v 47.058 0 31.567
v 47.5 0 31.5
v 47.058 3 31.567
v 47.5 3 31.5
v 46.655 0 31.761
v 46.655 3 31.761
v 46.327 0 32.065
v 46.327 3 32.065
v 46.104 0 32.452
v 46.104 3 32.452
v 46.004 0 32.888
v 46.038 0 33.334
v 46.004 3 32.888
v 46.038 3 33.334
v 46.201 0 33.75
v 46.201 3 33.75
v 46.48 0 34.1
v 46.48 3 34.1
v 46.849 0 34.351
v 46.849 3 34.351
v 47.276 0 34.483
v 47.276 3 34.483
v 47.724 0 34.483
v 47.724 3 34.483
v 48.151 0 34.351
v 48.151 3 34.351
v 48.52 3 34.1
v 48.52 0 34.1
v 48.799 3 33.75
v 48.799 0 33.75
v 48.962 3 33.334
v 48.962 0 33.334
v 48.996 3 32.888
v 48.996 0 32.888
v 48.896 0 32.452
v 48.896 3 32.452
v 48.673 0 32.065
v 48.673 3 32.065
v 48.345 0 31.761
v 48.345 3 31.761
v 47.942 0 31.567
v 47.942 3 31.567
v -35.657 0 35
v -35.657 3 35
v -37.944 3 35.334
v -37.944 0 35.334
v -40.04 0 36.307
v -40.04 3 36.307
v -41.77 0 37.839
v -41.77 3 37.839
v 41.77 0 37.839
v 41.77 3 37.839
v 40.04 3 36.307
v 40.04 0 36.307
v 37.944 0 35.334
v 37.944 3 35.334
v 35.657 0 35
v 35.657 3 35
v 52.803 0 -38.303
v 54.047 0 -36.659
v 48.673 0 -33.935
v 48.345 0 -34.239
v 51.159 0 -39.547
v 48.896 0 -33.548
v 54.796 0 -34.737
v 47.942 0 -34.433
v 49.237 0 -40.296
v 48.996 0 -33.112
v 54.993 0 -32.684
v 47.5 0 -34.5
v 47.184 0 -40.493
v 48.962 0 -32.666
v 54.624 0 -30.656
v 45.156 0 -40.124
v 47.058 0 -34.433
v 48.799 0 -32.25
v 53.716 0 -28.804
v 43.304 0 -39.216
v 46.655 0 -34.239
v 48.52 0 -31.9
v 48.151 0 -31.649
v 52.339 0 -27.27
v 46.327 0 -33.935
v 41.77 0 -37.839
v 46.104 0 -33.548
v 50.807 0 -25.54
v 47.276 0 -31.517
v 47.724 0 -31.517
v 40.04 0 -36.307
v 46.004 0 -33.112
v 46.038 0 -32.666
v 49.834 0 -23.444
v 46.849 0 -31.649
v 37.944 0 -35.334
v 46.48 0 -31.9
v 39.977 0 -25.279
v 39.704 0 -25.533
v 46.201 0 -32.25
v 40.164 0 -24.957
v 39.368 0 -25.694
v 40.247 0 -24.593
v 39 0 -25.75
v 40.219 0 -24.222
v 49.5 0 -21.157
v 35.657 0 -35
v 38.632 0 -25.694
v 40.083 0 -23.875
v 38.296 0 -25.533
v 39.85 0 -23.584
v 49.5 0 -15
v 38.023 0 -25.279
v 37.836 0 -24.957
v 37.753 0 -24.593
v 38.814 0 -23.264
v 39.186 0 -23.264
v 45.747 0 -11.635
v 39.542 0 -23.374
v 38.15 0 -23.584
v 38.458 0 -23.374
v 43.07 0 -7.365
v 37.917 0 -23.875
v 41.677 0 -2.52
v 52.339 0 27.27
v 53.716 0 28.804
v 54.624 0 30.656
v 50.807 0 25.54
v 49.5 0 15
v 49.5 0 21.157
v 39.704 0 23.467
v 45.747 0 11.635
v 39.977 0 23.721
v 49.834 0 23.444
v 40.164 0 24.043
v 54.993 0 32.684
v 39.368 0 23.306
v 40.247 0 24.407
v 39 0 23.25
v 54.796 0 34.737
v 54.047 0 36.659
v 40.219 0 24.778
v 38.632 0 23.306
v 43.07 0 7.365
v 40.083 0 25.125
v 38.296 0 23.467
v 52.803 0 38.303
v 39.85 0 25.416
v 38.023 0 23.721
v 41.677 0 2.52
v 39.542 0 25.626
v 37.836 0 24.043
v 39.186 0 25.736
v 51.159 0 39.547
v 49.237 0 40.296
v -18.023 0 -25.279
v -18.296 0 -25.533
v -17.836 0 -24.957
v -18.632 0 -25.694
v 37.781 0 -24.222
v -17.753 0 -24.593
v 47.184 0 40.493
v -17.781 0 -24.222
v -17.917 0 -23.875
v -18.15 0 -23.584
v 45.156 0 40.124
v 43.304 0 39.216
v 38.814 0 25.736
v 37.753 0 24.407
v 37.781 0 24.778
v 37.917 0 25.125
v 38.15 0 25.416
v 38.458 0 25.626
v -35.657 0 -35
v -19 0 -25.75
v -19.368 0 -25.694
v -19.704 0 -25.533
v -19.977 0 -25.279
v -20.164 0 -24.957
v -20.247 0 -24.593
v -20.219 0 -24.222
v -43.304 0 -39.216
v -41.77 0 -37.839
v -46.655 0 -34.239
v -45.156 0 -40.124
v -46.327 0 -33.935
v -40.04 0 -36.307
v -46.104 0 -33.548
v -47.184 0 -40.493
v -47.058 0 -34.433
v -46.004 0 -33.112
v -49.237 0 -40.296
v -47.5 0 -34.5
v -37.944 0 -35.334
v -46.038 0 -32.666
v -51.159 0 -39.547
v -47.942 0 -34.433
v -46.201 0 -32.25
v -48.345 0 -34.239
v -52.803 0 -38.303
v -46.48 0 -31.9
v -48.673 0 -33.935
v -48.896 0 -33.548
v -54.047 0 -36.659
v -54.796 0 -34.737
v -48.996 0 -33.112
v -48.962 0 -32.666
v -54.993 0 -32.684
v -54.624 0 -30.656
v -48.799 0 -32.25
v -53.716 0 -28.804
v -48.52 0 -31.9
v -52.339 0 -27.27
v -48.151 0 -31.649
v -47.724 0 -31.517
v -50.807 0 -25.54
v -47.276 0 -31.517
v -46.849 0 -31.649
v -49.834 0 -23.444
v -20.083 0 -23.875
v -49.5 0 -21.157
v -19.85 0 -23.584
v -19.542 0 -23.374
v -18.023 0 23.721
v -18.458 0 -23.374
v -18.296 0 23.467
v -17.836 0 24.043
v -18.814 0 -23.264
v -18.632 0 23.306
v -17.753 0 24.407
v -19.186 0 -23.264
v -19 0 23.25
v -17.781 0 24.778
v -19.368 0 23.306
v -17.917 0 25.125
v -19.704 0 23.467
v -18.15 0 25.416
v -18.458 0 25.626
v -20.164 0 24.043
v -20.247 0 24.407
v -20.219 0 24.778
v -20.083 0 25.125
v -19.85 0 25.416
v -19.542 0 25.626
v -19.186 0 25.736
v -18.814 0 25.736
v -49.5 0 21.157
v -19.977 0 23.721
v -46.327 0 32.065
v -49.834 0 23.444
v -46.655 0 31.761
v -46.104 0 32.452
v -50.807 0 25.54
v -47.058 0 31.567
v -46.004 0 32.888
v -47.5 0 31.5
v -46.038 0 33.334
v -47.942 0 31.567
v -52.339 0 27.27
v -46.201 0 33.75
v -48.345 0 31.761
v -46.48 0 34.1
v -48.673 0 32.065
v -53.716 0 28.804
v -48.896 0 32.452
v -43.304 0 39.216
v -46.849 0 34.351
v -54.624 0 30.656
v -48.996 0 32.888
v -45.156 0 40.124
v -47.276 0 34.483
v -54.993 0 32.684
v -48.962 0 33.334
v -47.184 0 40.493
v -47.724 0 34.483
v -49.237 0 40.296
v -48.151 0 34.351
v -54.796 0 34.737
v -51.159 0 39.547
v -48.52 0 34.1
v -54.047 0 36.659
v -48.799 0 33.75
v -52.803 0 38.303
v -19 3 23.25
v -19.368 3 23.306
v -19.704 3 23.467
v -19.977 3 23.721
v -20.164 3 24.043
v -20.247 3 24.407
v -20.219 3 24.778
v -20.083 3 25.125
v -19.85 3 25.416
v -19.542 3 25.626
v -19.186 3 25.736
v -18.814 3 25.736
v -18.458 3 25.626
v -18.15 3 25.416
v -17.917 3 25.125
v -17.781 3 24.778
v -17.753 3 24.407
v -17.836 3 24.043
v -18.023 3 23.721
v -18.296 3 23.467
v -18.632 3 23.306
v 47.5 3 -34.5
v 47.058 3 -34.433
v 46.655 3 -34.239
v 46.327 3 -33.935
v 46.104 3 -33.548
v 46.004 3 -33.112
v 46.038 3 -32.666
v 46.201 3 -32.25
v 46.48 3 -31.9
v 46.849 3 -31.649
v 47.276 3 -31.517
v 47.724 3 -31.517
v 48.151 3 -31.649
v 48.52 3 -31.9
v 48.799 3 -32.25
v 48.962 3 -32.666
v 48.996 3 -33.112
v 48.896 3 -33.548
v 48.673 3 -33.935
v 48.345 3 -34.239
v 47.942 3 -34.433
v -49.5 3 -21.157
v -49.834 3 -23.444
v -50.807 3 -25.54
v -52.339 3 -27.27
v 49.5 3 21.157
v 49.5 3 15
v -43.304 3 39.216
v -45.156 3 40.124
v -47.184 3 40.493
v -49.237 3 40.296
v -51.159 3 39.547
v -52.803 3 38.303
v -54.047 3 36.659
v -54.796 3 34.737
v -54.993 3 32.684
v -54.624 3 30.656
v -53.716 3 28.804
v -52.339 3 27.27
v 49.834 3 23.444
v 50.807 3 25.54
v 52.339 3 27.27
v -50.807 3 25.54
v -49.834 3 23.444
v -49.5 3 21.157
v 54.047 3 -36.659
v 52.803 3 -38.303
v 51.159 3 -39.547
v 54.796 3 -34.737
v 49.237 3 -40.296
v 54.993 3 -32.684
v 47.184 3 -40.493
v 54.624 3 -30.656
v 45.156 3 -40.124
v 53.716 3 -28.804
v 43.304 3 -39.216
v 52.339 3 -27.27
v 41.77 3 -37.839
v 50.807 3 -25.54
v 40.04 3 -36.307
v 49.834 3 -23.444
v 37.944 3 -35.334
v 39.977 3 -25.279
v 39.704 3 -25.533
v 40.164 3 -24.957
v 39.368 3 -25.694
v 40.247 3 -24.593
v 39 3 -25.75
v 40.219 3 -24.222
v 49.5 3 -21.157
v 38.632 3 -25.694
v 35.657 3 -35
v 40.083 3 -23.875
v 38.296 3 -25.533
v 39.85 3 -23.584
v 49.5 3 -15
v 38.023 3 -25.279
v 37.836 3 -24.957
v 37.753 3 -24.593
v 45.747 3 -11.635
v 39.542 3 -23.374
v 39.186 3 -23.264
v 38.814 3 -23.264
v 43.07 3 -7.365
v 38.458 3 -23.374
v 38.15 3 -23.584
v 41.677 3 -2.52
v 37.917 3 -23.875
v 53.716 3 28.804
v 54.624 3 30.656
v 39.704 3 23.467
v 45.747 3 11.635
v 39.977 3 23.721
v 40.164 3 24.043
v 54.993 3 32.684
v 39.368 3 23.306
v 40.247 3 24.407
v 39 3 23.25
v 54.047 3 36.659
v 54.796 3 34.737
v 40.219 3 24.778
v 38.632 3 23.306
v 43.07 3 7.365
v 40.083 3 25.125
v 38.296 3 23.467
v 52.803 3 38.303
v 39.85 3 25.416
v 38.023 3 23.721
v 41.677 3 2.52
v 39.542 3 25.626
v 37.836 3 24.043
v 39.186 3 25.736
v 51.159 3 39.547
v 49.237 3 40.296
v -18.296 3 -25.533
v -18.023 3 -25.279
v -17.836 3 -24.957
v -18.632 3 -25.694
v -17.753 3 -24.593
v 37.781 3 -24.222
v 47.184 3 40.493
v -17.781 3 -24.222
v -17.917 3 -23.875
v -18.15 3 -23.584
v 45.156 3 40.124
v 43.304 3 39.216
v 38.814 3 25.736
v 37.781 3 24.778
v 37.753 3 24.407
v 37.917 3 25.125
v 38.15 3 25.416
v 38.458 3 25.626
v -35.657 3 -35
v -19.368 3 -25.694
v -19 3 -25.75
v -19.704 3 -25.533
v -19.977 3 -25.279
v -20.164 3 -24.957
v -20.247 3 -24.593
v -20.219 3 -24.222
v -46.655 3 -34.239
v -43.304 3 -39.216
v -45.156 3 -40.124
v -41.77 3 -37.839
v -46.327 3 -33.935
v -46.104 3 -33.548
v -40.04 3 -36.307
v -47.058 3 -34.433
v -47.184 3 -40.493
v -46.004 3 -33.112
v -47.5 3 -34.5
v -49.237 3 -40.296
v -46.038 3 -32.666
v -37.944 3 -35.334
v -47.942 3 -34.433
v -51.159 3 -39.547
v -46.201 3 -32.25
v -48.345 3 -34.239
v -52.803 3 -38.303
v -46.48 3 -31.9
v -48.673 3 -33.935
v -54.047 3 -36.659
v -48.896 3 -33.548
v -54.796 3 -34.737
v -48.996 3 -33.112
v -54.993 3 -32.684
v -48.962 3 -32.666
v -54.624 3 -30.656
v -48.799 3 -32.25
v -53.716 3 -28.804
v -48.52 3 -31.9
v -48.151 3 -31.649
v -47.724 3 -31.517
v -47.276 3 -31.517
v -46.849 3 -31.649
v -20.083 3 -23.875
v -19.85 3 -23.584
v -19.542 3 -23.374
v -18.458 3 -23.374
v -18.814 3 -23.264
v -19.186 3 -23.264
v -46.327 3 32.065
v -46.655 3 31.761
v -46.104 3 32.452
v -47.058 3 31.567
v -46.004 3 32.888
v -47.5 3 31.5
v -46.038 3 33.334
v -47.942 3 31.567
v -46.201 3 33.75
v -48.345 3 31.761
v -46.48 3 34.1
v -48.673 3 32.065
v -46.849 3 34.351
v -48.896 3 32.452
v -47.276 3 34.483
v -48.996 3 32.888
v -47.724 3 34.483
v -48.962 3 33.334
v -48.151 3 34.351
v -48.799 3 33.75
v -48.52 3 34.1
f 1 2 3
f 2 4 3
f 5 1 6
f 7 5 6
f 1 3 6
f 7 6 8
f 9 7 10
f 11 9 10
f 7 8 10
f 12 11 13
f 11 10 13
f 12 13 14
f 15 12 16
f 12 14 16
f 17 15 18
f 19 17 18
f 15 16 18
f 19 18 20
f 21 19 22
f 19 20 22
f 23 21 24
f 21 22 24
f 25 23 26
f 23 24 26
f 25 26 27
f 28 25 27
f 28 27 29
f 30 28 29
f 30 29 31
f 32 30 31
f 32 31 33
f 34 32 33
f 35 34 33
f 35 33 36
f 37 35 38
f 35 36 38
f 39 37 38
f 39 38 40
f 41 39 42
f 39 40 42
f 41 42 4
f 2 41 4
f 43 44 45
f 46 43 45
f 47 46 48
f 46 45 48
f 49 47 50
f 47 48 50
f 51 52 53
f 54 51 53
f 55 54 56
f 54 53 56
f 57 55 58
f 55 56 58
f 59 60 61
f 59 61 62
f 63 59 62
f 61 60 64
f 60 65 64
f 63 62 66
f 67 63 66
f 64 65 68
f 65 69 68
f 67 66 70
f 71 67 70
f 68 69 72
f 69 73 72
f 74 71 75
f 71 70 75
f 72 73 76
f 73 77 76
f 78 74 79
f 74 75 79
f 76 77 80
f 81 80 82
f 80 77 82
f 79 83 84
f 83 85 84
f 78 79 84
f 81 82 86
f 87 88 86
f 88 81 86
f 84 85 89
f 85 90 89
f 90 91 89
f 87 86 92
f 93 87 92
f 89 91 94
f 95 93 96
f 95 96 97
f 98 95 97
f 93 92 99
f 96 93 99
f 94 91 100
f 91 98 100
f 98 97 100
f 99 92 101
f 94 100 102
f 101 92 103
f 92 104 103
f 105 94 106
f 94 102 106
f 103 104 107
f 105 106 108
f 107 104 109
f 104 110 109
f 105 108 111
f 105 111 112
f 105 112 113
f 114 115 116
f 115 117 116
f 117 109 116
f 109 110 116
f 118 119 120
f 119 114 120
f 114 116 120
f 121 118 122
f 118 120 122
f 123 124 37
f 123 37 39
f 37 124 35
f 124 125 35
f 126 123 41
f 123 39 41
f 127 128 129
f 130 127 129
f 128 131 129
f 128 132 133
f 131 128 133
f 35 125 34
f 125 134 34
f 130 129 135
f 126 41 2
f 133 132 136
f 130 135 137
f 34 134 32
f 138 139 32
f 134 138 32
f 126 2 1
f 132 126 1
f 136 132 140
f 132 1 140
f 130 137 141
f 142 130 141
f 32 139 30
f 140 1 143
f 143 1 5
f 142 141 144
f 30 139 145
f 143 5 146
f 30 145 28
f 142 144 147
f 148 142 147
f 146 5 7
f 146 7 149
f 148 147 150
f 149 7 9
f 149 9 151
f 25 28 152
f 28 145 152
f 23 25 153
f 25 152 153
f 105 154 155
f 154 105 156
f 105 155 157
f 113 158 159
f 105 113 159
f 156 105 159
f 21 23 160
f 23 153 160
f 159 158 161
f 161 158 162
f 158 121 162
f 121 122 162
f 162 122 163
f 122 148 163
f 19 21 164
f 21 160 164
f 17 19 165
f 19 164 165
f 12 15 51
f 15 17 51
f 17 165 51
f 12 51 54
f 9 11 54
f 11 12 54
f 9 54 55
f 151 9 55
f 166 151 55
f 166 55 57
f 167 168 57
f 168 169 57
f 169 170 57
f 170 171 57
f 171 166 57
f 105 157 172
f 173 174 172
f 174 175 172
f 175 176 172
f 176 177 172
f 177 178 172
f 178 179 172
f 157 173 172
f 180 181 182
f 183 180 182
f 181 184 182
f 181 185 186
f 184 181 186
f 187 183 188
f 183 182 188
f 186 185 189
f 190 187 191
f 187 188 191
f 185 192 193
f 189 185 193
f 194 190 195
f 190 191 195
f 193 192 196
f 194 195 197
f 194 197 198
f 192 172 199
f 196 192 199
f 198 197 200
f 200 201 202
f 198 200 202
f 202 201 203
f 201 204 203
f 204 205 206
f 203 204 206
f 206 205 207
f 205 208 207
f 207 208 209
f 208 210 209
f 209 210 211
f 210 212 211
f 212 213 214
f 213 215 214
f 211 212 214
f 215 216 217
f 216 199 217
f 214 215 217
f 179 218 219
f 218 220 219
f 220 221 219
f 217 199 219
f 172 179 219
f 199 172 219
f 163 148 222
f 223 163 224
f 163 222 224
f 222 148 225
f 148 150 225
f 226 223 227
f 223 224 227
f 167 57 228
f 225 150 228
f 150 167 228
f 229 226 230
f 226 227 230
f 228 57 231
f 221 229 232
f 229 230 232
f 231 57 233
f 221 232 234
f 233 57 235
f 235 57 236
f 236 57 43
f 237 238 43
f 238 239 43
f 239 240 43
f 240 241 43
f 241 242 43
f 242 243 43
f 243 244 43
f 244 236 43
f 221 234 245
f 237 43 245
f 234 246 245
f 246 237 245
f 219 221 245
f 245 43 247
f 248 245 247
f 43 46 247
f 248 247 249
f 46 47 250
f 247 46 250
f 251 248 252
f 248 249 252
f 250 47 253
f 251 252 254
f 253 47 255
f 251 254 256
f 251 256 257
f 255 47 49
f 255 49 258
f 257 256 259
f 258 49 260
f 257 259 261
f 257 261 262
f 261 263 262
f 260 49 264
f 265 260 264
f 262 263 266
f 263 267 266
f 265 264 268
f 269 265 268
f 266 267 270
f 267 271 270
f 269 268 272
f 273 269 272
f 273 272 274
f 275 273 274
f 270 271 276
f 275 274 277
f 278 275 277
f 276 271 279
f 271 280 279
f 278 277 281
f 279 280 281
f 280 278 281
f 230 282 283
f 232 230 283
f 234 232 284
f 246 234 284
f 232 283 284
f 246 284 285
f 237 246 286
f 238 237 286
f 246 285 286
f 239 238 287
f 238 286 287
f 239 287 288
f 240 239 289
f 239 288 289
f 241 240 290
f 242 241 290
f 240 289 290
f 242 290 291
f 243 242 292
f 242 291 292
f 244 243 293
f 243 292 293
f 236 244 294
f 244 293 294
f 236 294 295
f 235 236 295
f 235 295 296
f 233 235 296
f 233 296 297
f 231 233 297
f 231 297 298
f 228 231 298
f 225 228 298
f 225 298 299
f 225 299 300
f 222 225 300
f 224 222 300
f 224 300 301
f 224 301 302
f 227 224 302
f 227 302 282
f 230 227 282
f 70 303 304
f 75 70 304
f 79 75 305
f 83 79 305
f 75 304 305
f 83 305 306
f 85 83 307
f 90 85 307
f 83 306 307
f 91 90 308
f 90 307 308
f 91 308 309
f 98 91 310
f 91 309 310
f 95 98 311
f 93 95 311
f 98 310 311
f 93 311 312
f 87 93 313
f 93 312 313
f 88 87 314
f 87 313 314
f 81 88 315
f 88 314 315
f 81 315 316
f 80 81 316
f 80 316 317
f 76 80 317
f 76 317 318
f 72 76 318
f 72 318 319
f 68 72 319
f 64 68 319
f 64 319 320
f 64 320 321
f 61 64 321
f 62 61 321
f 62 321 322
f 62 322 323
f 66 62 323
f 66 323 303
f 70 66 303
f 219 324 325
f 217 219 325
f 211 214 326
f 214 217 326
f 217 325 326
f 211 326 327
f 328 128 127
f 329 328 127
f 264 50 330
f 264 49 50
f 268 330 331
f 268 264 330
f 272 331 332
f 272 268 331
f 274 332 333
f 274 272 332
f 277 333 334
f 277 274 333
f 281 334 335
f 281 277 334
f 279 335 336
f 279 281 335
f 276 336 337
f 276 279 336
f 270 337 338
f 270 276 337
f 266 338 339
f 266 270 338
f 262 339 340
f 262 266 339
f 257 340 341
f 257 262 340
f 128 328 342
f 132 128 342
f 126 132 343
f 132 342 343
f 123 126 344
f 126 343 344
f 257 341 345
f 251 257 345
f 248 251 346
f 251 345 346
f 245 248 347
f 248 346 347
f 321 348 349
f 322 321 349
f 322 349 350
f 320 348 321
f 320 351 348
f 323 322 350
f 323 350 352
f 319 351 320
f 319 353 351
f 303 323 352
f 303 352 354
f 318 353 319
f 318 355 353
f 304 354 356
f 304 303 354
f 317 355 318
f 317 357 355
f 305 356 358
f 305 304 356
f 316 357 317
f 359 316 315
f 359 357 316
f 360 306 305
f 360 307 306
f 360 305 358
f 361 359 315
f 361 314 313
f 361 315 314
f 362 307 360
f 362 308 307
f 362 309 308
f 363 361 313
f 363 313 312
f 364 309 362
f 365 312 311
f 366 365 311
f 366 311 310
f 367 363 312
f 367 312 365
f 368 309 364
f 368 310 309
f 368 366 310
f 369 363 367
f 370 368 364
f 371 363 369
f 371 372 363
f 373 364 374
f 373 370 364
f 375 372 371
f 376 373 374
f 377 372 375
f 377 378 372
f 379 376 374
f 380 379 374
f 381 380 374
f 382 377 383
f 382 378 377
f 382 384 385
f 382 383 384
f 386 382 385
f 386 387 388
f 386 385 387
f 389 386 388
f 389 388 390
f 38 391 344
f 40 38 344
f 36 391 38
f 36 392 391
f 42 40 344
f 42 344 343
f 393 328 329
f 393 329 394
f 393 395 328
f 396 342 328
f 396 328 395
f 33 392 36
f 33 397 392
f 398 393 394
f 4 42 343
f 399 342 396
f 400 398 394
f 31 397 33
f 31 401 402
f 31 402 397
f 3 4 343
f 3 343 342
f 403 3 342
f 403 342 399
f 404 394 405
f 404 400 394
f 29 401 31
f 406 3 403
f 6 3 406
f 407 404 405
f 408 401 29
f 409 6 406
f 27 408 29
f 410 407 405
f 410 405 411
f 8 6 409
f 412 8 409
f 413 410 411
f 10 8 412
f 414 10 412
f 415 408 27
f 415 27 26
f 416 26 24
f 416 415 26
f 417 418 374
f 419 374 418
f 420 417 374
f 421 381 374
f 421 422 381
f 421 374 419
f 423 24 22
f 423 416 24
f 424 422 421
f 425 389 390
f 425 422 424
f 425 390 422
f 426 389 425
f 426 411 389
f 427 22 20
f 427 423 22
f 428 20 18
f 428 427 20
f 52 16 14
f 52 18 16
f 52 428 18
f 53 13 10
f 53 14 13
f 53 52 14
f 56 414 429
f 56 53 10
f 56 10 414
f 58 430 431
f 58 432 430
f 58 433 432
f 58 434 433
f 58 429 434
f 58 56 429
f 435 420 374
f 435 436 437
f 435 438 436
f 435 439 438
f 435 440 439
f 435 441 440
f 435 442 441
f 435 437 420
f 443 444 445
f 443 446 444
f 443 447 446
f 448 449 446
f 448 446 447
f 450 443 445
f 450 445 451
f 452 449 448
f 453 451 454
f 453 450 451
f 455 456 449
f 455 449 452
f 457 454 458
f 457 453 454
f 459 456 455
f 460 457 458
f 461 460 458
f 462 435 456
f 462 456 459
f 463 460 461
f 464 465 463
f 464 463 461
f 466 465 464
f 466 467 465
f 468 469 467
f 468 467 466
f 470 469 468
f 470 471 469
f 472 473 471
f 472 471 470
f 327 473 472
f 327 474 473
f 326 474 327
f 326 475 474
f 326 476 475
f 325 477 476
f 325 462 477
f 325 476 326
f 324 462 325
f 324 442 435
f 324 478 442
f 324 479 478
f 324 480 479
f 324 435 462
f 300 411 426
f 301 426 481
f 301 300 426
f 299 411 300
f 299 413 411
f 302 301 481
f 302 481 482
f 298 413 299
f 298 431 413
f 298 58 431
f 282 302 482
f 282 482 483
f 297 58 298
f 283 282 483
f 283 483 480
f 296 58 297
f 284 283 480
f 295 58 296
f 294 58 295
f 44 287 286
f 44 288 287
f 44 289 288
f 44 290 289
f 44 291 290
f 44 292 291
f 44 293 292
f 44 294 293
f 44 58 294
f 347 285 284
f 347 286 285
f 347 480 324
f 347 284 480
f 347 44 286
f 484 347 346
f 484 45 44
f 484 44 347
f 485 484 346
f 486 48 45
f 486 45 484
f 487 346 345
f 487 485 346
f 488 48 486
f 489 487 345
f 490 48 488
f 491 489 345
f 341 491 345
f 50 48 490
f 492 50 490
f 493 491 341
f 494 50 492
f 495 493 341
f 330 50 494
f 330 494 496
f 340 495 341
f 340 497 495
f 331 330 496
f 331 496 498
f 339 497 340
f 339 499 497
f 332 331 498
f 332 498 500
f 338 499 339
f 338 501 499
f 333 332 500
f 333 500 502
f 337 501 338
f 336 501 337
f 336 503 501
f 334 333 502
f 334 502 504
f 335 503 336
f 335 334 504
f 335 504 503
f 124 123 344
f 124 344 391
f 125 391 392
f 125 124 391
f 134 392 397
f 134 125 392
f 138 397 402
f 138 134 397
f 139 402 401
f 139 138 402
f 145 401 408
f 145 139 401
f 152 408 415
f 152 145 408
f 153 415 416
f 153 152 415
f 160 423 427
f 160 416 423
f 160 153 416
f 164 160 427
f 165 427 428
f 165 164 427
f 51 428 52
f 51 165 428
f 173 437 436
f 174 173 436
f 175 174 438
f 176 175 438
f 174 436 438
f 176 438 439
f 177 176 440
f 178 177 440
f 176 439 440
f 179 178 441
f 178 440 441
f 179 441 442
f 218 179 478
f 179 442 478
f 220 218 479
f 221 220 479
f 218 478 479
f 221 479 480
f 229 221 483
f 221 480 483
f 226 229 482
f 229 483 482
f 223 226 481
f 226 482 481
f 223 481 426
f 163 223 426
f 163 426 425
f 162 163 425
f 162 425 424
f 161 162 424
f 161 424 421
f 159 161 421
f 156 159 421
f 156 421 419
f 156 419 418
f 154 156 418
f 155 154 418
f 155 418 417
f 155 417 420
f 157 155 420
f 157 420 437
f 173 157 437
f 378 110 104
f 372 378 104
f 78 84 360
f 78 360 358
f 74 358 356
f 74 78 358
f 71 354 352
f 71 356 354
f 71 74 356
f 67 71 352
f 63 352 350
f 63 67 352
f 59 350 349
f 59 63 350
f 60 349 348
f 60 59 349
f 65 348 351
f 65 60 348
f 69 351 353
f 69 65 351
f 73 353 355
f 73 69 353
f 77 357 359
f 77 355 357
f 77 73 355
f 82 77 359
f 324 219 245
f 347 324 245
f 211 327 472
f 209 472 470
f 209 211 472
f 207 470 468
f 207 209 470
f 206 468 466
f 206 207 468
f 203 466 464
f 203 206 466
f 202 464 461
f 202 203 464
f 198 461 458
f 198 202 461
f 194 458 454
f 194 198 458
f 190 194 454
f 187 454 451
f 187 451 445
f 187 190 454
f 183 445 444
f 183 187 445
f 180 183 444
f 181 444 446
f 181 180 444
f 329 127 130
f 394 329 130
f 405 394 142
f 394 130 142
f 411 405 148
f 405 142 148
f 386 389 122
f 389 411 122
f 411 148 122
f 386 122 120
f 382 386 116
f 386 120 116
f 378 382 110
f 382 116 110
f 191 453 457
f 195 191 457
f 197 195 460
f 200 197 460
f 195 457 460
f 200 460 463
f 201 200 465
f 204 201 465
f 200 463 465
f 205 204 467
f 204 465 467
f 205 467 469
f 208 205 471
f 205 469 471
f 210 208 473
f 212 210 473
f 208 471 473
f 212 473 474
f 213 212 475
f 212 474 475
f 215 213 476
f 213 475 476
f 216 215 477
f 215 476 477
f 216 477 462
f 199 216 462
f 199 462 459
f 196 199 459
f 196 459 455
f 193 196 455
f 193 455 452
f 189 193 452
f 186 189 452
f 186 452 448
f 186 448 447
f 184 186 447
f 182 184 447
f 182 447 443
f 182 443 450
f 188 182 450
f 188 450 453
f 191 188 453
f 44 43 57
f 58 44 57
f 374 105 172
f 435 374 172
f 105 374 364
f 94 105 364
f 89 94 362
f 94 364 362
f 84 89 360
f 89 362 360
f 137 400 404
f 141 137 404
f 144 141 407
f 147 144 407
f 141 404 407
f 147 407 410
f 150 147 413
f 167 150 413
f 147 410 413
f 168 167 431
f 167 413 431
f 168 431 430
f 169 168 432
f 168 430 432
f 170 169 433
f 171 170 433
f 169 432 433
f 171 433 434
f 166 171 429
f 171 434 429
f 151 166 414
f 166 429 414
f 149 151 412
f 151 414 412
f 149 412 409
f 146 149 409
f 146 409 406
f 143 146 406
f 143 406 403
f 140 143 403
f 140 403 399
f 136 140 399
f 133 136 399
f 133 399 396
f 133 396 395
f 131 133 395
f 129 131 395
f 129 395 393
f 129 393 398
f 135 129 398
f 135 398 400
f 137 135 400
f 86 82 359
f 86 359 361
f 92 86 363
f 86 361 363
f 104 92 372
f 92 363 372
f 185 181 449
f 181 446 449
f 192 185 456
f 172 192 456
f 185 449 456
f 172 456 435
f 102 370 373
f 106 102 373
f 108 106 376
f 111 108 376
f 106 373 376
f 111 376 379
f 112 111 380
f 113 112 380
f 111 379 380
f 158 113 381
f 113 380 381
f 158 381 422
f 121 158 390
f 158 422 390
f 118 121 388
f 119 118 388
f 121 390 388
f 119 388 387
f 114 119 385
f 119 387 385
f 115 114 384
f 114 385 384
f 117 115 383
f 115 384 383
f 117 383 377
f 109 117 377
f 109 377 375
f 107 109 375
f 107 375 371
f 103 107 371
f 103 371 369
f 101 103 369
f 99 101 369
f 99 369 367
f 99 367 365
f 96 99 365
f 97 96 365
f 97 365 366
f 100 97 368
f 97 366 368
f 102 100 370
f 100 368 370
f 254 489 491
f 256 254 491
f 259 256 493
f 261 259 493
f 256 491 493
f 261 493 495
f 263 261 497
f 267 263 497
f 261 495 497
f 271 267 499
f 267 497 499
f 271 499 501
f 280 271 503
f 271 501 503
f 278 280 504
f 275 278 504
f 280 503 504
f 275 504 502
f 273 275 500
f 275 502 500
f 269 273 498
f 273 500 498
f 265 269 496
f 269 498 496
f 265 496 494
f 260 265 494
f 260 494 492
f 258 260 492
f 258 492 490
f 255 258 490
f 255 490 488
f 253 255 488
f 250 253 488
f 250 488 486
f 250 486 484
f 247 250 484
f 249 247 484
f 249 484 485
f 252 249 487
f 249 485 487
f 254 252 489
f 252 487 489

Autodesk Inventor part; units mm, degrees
ref_plane "YZ Plane" through (0, 0, 0) normal (1, 0, 0) x (0, 1, 0)
ref_plane "XZ Plane" through (0, 0, 0) normal (0, 1, 0) x (-1, 0, 0)
ref_plane "XY Plane" through (0, 0, 0) normal (0, 0, 1) x (1, 0, 0)
sketch "Sketch1" plane through (0, 0, 0) normal (0, 1, 0) x (-1, 0, 0)
  line L0 (-39, -24.5) -> (19, -24.5) construction
  line L1 (19, -24.5) -> (19, 24.5) construction
  line L2 (19, 24.5) -> (-39, 24.5) construction
  line L3 (-39, 24.5) -> (-39, -24.5) construction
  line L4 (42.5, -28) -> (-42.5, -28) construction
  line L5 (-42.5, -28) -> (-42.5, 28) construction
  line L6 (-42.5, 28) -> (42.5, 28) construction
  line L7 (42.5, 28) -> (42.5, -28) construction
  line L8 (50, 0) -> (-50, 0) construction
  line L9 (47.5, -33) -> (-47.5, -33) construction
  line L10 (-47.5, -33) -> (-47.5, 33) construction
  line L11 (-47.5, 33) -> (47.5, 33) construction
  line L12 (47.5, 33) -> (47.5, -33) construction
  circle A0 centre (47.5, -33) radius 7.5
  circle A1 centre (47.5, 33) radius 7.5
  circle A2 centre (-47.5, 33) radius 7.5
  circle A3 centre (-47.5, -33) radius 7.5
  line L13 (49.5, -25.7716) -> (49.5, 25.7716)
  line L14 (40.2716, 35) -> (-40.2716, 35)
  line L15 (-49.5, 25.7716) -> (-49.5, -25.7716)
  line L16 (-40.2716, -35) -> (40.2716, -35)
  arc A4 (-49.5, -15) -> (-49.5, 15) centre (-59.5625, 0) ccw
  point P0 (0, 0)
  point P1 (-39, 0)
  point P2 (0, 0)
  point P3 (0, -28)
  point P4 (0, 0)
  point P5 (0, -33)
  point P6 (-47.5, 0)
  point P7 (-41.5, 0)
  dimension "d0" = 58
  dimension "d1" = 49
  dimension "d2" = 3.5
  dimension "d3" = 3.5
  dimension "d25" = 5
  dimension "d26" = 5
  dimension "d27" = 15
  dimension "d28" = 85
  dimension "d29" = 2
  dimension "d30" = 2
  dimension "d32" = 30
  dimension "d33" = 8
extrude "Extrusion1" add sketch "Sketch1" along normal blind 3 contours A0 | A0 L16 A3 L15 A4 A2 L14 A1 L13 | A1 | A3 | A2
fillet "Fillet2" radius 8 8 edges at (-49.5, 1.5, -25.7716) (-49.5, 1.5, 25.7716) (-40.2716, 1.5, 35) (40.2716, 1.5, 35) (49.5, 1.5, 25.7716) (49.5, 1.5, -25.7716) (40.2716, 1.5, -35) (-40.2716, 1.5, -35)
hole "Hole1" at (-47.5, 0, 33) at (-47.5, 0, -33) at (47.5, 0, -33) at (47.5, 0, 33) direction (0, 1, 0) diameter 3 end through all
hole "Hole2" at (-19, 0, 24.5) at (-19, 0, -24.5) at (39, 0, -24.5) at (39, 0, 24.5) direction (0, 1, 0) diameter 2.5 end through all
sketch "Sketch3" plane through (0, 3, 0) normal (0, 1, 0) x (1, 0, 0)
  circle A0 centre (39, 24.5) radius 1.25 projected
  circle A1 centre (-19, -24.5) radius 1.25 projected
  circle A2 centre (-19, 24.5) radius 1.25 projected
  circle A3 centre (39, -24.5) radius 1.25 projected
  circle A4 centre (47.5, 33) radius 1.5 projected
  circle A5 centre (-47.5, -33) radius 1.5 projected
  circle A6 centre (-47.5, 33) radius 1.5 projected
  circle A7 centre (47.5, -33) radius 1.5 projected
  line L0 (49.5, 15) -> (49.5, 21.1573) projected
  arc A8 (52.3387, 27.2697) -> (49.5, 21.1573) centre (57.5, 21.1573) ccw projected
  arc A9 (52.3387, 27.2697) -> (41.7697, 37.8387) centre (47.5, 33) ccw projected
  arc A10 (35.6573, 35) -> (41.7697, 37.8387) centre (35.6573, 43) ccw projected
  line L1 (35.6573, 35) -> (-35.6573, 35) projected
  arc A11 (-41.7697, 37.8387) -> (-35.6573, 35) centre (-35.6573, 43) ccw projected
  arc A12 (-41.7697, 37.8387) -> (-52.3387, 27.2697) centre (-47.5, 33) ccw projected
  arc A13 (-49.5, 21.1573) -> (-52.3387, 27.2697) centre (-57.5, 21.1573) ccw projected
  line L2 (-49.5, 21.1573) -> (-49.5, -21.1573) projected
  arc A14 (-52.3387, -27.2697) -> (-49.5, -21.1573) centre (-57.5, -21.1573) ccw projected
  arc A15 (-52.3387, -27.2697) -> (-41.7697, -37.8387) centre (-47.5, -33) ccw projected
  arc A16 (-35.6573, -35) -> (-41.7697, -37.8387) centre (-35.6573, -43) ccw projected
  line L3 (-35.6573, -35) -> (35.6573, -35) projected
  arc A17 (41.7697, -37.8387) -> (35.6573, -35) centre (35.6573, -43) ccw projected
  arc A18 (41.7697, -37.8387) -> (52.3387, -27.2697) centre (47.5, -33) ccw projected
  arc A19 (49.5, -21.1573) -> (52.3387, -27.2697) centre (57.5, -21.1573) ccw projected
  line L4 (49.5, -21.1573) -> (49.5, -15) projected
  arc A20 (49.5, 15) -> (49.5, -15) centre (59.5625, 0) ccw projected
  point P0 (0, 0)
equation "\"d3\" = d2"
equation "\"d26\" = d25"
equation "\"d30\" = d29"
properties part number "plate_mounting"
